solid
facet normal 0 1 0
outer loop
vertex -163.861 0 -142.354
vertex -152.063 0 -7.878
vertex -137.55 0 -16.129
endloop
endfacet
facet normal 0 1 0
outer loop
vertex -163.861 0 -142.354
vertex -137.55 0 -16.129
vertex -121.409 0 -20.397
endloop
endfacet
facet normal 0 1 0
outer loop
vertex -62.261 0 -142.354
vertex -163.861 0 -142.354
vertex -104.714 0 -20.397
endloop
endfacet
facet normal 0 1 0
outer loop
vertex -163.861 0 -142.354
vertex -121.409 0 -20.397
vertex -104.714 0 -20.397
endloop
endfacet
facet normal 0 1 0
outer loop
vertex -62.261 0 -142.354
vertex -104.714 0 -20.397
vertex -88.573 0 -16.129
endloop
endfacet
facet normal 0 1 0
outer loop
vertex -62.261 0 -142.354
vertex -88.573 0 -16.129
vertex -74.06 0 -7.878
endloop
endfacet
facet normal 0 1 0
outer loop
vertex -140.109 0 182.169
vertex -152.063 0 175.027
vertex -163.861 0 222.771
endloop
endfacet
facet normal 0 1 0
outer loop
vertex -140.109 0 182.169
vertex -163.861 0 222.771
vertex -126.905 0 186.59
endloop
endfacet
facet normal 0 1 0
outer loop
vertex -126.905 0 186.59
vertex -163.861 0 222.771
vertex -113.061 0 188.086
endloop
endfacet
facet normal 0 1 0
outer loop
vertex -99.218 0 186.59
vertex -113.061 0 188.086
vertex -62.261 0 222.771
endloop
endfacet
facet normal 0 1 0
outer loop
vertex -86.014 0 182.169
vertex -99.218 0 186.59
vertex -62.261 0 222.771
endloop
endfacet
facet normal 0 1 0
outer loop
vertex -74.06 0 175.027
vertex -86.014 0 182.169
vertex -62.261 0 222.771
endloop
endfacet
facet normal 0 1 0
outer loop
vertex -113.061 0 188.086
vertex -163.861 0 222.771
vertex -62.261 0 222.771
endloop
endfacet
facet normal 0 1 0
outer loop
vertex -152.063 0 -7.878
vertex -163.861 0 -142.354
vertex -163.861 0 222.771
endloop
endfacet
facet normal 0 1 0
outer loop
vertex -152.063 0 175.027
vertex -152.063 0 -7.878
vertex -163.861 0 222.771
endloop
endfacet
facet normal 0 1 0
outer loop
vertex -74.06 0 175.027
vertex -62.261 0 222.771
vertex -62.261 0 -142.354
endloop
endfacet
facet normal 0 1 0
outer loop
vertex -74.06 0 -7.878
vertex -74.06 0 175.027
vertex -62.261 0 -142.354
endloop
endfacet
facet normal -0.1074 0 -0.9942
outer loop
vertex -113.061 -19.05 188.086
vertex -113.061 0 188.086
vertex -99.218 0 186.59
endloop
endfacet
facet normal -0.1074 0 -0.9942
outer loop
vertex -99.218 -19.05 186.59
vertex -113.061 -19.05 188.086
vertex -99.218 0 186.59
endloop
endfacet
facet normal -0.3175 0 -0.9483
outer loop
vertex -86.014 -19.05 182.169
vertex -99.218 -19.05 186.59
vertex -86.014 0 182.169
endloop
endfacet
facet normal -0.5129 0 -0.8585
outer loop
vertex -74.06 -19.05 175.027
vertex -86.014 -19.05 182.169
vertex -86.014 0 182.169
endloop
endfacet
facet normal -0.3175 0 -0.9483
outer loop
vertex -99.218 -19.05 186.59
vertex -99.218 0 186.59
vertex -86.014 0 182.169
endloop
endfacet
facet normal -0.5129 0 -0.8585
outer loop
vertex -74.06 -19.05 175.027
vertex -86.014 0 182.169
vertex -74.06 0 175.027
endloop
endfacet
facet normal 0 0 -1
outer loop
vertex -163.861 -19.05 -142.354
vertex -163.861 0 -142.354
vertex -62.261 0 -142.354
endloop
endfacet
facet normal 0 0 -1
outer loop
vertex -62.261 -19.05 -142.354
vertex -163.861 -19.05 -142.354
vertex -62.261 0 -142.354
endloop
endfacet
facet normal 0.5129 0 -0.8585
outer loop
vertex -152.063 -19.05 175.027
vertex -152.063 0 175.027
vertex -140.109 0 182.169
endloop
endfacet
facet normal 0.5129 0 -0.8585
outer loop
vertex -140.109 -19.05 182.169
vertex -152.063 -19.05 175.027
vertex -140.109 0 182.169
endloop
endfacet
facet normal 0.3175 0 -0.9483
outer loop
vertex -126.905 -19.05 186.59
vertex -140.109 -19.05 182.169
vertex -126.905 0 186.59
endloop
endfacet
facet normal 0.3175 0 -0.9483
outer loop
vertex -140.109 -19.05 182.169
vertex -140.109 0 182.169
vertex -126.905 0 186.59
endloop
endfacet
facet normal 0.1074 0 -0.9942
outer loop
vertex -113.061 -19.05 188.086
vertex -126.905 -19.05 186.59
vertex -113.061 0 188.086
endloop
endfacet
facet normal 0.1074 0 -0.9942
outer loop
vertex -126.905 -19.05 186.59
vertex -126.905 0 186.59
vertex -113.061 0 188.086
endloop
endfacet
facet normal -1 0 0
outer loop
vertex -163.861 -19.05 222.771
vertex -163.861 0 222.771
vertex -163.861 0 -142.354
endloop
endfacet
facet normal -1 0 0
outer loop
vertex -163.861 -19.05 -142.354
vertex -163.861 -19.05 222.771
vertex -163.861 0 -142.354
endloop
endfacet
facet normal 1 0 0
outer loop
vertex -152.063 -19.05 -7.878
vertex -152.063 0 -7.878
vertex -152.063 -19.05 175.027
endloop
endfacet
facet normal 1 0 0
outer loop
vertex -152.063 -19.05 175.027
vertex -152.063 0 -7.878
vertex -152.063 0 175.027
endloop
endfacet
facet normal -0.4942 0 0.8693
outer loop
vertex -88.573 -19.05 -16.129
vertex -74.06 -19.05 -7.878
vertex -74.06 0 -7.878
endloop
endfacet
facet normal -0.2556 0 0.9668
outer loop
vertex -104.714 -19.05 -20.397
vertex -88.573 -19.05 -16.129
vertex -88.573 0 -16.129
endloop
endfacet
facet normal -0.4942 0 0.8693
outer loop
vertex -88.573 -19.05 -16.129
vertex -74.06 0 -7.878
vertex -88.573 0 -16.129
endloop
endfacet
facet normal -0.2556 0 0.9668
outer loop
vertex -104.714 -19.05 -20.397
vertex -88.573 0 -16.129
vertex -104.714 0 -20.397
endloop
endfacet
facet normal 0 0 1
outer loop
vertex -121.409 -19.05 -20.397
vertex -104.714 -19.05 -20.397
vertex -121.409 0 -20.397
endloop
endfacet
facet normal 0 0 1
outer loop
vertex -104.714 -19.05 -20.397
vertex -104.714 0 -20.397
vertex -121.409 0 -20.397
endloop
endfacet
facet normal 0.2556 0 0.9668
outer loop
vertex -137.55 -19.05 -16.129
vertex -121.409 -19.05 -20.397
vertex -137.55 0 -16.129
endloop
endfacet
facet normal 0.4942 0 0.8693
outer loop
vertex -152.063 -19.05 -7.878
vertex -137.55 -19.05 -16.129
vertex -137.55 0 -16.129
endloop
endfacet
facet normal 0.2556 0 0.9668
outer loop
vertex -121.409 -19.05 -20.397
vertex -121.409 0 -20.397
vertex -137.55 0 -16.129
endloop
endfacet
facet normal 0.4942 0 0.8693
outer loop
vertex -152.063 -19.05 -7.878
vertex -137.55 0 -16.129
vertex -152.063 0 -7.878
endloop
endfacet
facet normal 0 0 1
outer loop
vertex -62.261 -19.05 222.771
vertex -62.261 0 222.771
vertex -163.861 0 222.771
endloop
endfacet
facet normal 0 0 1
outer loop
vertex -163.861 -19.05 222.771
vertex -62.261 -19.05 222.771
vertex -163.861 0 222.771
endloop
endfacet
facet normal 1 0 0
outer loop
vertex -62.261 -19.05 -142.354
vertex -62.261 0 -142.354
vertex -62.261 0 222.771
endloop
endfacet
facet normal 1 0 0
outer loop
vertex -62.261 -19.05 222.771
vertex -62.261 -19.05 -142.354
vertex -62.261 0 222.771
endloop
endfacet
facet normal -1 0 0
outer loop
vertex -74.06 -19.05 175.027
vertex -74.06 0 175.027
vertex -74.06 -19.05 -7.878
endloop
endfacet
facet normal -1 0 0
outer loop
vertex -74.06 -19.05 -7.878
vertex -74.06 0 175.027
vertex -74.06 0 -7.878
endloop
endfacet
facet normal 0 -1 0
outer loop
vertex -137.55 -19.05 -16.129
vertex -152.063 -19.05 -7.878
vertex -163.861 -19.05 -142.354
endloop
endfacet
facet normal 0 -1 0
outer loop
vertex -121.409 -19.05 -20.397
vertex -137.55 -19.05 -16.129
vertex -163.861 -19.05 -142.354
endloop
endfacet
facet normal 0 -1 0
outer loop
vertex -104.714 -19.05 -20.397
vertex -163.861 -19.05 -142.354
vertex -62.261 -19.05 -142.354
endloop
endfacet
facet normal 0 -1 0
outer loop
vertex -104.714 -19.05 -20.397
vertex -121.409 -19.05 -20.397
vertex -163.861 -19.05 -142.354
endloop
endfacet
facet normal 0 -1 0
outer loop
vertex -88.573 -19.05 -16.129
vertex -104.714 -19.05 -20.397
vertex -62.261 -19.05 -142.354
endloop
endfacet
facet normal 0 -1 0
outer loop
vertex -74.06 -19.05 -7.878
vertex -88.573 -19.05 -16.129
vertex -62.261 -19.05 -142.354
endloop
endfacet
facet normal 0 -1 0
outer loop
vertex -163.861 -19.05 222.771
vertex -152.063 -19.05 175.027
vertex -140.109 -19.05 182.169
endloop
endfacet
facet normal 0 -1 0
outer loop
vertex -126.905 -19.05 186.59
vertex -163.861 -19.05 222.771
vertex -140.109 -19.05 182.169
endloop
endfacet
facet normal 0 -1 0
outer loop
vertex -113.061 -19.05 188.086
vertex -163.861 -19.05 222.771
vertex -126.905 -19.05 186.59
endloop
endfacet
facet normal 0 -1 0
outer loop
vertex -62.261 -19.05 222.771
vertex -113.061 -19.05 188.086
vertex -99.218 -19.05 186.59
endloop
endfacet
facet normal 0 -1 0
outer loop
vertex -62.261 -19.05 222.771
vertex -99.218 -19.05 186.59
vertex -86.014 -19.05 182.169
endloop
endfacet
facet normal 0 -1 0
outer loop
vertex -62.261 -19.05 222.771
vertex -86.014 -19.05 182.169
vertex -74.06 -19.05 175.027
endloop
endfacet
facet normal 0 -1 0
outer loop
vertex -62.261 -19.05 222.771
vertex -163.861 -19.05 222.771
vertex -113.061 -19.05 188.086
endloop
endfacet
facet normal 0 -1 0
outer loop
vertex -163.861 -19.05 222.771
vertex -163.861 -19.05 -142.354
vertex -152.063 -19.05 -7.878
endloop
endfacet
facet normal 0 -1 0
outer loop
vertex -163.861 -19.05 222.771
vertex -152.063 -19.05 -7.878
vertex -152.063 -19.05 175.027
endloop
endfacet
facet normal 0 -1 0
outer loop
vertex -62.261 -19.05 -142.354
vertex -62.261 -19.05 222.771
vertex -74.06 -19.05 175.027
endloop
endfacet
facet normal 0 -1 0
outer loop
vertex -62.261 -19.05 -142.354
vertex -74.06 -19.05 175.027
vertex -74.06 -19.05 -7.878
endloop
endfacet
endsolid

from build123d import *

# Parameters (mm, degrees)
F1_DEPTH = 19.05


with BuildPart() as f1:
    # F0 (on Front) → F1 (new body)
    with BuildSketch(Plane.XZ):
        Polygon((-163.861383, 222.770982), (-163.861383, -142.354018), (-62.261383, -142.354018), (-62.261383, 222.770982), (-113.061383, 222.770982), align=None)
        with BuildLine():
            ThreePointArc((-152.063083, 175.027341), (-133.626353, 184.734933), (-113.061383, 188.08641))
            ThreePointArc((-113.061383, 188.08641), (-92.496414, 184.734933), (-74.059683, 175.027341))
            Line((-74.059683, 175.027341), (-74.059683, -7.878059))
            ThreePointArc((-74.059683, -7.878059), (-113.061383, -20.937129), (-152.063083, -7.878059))
            Line((-152.063083, -7.878059), (-152.063083, 175.027341))
        make_face(mode=Mode.SUBTRACT)
    extrude(amount=F1_DEPTH)


solid = f1.part
